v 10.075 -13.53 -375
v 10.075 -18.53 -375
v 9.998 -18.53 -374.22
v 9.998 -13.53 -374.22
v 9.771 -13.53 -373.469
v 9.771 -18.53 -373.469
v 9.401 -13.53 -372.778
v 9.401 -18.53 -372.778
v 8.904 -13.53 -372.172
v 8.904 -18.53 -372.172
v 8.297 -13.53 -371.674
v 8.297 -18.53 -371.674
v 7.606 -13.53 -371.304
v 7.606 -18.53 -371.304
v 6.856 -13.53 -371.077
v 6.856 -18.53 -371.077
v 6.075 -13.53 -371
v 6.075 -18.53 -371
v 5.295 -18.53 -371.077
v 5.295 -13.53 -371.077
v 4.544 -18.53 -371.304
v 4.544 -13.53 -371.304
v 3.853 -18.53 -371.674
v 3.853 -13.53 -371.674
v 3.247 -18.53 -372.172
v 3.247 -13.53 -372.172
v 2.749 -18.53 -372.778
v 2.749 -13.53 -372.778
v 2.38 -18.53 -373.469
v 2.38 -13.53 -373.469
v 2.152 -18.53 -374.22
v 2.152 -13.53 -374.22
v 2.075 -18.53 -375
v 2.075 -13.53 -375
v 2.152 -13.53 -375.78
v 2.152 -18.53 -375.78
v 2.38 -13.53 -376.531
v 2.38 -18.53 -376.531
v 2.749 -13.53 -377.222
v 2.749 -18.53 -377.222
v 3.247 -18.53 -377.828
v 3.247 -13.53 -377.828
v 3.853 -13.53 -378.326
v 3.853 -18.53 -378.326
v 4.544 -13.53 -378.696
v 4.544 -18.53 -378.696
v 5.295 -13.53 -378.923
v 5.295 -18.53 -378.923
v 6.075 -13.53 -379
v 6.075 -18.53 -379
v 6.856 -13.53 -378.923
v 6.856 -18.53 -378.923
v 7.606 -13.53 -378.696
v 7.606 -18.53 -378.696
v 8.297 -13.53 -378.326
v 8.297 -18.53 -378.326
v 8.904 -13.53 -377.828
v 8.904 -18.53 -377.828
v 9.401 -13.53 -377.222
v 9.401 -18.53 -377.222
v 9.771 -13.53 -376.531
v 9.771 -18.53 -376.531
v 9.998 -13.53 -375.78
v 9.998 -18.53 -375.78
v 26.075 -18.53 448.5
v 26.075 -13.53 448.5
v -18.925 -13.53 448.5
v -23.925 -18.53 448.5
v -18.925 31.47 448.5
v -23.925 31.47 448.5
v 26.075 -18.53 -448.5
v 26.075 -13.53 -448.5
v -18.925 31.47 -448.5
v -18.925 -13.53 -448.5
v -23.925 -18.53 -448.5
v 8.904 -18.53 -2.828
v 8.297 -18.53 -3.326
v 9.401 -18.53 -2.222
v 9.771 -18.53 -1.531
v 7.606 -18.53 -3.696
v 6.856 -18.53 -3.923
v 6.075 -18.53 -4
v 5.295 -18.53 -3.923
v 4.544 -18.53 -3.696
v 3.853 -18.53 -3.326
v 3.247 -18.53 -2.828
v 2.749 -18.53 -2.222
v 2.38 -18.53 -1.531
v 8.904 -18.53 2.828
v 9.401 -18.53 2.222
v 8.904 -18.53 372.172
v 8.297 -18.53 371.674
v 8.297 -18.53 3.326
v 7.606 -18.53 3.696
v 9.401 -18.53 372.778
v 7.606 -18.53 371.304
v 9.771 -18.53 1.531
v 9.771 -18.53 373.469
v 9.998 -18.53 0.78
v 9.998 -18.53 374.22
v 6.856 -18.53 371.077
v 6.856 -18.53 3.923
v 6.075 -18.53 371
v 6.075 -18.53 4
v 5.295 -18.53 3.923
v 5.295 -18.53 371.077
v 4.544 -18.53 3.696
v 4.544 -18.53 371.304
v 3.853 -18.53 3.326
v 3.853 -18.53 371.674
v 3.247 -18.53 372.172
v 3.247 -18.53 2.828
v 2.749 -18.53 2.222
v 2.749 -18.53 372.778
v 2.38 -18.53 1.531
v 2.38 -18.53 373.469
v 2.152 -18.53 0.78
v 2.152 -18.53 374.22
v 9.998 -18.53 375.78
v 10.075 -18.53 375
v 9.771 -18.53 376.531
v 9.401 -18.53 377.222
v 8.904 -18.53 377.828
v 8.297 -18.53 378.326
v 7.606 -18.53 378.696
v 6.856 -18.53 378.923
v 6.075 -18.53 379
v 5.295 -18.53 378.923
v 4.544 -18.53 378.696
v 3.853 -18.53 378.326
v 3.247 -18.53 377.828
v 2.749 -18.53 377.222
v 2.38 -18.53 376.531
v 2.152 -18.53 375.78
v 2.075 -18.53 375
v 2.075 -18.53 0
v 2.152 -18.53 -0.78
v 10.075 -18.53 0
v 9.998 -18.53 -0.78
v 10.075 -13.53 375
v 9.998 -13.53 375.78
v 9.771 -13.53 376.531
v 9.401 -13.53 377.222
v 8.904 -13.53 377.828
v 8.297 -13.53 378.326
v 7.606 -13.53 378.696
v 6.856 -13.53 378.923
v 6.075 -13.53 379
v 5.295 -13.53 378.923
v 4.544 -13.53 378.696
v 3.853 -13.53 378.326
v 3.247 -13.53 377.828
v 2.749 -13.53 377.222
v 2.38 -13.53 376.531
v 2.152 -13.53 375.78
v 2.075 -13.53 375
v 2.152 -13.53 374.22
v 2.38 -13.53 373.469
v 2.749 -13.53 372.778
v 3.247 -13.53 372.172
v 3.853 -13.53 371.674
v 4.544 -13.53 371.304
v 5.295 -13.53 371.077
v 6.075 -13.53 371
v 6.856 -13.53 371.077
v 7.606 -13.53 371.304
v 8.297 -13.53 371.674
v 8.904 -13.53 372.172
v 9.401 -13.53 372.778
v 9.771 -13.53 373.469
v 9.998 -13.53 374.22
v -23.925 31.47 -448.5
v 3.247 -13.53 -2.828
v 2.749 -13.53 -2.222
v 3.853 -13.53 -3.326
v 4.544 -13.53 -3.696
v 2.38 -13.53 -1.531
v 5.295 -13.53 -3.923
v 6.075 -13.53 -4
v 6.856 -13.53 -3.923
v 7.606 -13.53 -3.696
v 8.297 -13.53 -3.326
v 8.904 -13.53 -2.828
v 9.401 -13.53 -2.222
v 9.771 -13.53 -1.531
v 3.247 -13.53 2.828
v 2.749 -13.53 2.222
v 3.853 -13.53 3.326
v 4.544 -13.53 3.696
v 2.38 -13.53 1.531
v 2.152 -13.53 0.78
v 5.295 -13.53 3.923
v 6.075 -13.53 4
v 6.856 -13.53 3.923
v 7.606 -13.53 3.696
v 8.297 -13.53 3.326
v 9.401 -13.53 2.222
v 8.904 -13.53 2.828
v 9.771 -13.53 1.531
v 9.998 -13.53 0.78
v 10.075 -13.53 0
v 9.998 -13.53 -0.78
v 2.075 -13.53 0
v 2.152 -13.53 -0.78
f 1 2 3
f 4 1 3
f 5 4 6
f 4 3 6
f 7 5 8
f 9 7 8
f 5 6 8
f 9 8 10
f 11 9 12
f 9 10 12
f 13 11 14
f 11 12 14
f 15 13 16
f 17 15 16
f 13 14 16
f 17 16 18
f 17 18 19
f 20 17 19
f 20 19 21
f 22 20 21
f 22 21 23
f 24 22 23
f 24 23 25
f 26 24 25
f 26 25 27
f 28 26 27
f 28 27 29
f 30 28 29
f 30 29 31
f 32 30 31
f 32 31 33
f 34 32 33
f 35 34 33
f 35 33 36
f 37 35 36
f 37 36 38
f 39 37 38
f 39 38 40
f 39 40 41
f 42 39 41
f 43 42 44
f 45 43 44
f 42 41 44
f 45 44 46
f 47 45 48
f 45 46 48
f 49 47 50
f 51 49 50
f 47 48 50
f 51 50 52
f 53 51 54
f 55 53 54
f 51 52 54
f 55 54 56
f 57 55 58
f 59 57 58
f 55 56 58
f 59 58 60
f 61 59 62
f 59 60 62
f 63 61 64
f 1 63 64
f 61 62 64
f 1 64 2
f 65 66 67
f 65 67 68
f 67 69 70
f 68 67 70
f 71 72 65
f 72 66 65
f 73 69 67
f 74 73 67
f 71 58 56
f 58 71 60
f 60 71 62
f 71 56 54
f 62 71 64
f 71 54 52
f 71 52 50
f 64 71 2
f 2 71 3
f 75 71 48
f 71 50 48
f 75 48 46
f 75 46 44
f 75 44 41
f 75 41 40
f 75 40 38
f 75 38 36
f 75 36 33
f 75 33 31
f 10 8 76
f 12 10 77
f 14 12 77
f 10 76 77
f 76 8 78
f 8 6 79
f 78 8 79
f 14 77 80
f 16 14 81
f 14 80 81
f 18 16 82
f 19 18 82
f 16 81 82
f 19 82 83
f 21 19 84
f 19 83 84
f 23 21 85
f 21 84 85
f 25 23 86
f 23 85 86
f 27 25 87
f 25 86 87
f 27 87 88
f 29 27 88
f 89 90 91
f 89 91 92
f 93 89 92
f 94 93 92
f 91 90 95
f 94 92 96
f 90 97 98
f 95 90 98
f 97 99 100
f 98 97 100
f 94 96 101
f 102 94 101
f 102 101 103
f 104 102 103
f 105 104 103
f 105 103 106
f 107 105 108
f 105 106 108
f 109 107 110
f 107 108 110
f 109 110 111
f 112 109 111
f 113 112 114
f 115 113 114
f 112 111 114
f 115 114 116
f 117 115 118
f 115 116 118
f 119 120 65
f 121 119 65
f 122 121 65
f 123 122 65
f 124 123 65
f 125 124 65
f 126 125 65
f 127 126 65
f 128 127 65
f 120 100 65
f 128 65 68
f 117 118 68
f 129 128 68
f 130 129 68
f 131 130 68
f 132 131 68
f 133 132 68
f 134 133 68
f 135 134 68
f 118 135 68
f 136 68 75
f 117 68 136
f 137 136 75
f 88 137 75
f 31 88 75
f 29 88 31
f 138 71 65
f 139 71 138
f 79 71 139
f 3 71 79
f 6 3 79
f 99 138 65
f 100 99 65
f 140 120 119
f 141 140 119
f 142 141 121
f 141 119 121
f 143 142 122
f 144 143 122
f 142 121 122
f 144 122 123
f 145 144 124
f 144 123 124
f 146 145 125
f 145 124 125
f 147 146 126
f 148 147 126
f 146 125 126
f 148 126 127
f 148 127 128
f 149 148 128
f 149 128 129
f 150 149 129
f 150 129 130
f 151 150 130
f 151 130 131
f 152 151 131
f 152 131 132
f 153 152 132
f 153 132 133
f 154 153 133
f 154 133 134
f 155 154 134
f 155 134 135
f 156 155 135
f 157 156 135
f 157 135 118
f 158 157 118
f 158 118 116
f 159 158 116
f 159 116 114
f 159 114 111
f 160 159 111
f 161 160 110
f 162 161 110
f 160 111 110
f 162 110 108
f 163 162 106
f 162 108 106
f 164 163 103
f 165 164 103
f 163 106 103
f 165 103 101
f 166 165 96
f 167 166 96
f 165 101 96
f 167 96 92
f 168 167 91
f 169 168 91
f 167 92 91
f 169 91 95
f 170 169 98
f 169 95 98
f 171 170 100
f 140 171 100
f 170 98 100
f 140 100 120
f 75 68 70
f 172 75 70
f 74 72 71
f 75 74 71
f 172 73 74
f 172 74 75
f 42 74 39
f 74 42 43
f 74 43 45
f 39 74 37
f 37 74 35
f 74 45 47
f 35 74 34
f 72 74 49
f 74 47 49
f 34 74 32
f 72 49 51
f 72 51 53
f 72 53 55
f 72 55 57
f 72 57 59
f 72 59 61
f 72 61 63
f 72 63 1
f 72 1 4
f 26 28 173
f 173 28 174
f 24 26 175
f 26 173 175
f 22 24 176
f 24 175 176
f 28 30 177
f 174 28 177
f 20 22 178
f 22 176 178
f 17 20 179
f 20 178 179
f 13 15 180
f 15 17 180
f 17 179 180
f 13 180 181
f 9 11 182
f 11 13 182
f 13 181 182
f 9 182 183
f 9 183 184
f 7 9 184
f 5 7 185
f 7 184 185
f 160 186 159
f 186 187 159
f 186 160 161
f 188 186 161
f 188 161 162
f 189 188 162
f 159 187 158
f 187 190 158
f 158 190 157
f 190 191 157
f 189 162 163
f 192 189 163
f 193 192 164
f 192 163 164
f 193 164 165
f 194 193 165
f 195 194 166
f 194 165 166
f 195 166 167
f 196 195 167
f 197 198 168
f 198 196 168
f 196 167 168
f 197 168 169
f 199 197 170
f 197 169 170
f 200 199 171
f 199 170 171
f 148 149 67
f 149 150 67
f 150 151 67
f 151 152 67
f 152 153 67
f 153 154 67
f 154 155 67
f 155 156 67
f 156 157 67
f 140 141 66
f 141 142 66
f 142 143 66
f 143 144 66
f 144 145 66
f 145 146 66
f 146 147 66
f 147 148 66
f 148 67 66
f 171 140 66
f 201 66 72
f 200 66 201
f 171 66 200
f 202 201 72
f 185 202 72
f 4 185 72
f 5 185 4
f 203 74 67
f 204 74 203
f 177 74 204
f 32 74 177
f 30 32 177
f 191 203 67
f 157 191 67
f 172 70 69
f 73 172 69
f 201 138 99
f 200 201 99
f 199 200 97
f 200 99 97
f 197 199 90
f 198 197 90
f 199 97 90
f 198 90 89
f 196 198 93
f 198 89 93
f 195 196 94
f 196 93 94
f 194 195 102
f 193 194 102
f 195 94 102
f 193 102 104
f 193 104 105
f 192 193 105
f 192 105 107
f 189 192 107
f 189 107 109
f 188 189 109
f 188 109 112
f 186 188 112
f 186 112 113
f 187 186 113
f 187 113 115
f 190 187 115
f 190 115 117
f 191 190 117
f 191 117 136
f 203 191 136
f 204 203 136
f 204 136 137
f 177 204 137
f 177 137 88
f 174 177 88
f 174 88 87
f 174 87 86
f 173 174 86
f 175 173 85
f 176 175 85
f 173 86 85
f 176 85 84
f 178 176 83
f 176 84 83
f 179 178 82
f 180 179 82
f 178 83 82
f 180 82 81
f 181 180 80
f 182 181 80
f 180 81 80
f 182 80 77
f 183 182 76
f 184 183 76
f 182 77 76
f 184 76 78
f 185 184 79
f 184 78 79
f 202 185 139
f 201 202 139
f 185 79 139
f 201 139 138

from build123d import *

# Parameters (mm, degrees)
BOSS_EXTRUDE1_DEPTH = 448.5
SKETCH2_R           = 4
CUT_EXTRUDE1_DEPTH  = 10
LPATTERN1_COUNT     = 3
LPATTERN1_PITCH     = 375


with BuildPart() as part:
    # Sketch1 → Boss-Extrude1 (new, symmetric)
    with BuildSketch(Plane.XY):
        Polygon((-18.924824174, 31.469740292), (-18.924824174, -13.530259708), (26.075175826, -13.530259708), (26.075175826, -18.530259708), (-23.924824174, -18.530259708), (-23.924824174, 31.469740292), align=None)
    extrude(amount=BOSS_EXTRUDE1_DEPTH, both=True)

    # Sketch2 → Cut-Extrude1 (cut)
    with BuildSketch(Plane.XZ.offset(18.530259708)):
        with Locations((6.075175826, 375)):
            Circle(SKETCH2_R)
    cut_extrude1 = extrude(amount=-CUT_EXTRUDE1_DEPTH, mode=Mode.SUBTRACT)

    # LPattern1: Cut-Extrude1 ×3
    with Locations(*[(0, 0, -i * LPATTERN1_PITCH) for i in range(1, LPATTERN1_COUNT)]):
        add(cut_extrude1, mode=Mode.SUBTRACT)


solid = part.part
